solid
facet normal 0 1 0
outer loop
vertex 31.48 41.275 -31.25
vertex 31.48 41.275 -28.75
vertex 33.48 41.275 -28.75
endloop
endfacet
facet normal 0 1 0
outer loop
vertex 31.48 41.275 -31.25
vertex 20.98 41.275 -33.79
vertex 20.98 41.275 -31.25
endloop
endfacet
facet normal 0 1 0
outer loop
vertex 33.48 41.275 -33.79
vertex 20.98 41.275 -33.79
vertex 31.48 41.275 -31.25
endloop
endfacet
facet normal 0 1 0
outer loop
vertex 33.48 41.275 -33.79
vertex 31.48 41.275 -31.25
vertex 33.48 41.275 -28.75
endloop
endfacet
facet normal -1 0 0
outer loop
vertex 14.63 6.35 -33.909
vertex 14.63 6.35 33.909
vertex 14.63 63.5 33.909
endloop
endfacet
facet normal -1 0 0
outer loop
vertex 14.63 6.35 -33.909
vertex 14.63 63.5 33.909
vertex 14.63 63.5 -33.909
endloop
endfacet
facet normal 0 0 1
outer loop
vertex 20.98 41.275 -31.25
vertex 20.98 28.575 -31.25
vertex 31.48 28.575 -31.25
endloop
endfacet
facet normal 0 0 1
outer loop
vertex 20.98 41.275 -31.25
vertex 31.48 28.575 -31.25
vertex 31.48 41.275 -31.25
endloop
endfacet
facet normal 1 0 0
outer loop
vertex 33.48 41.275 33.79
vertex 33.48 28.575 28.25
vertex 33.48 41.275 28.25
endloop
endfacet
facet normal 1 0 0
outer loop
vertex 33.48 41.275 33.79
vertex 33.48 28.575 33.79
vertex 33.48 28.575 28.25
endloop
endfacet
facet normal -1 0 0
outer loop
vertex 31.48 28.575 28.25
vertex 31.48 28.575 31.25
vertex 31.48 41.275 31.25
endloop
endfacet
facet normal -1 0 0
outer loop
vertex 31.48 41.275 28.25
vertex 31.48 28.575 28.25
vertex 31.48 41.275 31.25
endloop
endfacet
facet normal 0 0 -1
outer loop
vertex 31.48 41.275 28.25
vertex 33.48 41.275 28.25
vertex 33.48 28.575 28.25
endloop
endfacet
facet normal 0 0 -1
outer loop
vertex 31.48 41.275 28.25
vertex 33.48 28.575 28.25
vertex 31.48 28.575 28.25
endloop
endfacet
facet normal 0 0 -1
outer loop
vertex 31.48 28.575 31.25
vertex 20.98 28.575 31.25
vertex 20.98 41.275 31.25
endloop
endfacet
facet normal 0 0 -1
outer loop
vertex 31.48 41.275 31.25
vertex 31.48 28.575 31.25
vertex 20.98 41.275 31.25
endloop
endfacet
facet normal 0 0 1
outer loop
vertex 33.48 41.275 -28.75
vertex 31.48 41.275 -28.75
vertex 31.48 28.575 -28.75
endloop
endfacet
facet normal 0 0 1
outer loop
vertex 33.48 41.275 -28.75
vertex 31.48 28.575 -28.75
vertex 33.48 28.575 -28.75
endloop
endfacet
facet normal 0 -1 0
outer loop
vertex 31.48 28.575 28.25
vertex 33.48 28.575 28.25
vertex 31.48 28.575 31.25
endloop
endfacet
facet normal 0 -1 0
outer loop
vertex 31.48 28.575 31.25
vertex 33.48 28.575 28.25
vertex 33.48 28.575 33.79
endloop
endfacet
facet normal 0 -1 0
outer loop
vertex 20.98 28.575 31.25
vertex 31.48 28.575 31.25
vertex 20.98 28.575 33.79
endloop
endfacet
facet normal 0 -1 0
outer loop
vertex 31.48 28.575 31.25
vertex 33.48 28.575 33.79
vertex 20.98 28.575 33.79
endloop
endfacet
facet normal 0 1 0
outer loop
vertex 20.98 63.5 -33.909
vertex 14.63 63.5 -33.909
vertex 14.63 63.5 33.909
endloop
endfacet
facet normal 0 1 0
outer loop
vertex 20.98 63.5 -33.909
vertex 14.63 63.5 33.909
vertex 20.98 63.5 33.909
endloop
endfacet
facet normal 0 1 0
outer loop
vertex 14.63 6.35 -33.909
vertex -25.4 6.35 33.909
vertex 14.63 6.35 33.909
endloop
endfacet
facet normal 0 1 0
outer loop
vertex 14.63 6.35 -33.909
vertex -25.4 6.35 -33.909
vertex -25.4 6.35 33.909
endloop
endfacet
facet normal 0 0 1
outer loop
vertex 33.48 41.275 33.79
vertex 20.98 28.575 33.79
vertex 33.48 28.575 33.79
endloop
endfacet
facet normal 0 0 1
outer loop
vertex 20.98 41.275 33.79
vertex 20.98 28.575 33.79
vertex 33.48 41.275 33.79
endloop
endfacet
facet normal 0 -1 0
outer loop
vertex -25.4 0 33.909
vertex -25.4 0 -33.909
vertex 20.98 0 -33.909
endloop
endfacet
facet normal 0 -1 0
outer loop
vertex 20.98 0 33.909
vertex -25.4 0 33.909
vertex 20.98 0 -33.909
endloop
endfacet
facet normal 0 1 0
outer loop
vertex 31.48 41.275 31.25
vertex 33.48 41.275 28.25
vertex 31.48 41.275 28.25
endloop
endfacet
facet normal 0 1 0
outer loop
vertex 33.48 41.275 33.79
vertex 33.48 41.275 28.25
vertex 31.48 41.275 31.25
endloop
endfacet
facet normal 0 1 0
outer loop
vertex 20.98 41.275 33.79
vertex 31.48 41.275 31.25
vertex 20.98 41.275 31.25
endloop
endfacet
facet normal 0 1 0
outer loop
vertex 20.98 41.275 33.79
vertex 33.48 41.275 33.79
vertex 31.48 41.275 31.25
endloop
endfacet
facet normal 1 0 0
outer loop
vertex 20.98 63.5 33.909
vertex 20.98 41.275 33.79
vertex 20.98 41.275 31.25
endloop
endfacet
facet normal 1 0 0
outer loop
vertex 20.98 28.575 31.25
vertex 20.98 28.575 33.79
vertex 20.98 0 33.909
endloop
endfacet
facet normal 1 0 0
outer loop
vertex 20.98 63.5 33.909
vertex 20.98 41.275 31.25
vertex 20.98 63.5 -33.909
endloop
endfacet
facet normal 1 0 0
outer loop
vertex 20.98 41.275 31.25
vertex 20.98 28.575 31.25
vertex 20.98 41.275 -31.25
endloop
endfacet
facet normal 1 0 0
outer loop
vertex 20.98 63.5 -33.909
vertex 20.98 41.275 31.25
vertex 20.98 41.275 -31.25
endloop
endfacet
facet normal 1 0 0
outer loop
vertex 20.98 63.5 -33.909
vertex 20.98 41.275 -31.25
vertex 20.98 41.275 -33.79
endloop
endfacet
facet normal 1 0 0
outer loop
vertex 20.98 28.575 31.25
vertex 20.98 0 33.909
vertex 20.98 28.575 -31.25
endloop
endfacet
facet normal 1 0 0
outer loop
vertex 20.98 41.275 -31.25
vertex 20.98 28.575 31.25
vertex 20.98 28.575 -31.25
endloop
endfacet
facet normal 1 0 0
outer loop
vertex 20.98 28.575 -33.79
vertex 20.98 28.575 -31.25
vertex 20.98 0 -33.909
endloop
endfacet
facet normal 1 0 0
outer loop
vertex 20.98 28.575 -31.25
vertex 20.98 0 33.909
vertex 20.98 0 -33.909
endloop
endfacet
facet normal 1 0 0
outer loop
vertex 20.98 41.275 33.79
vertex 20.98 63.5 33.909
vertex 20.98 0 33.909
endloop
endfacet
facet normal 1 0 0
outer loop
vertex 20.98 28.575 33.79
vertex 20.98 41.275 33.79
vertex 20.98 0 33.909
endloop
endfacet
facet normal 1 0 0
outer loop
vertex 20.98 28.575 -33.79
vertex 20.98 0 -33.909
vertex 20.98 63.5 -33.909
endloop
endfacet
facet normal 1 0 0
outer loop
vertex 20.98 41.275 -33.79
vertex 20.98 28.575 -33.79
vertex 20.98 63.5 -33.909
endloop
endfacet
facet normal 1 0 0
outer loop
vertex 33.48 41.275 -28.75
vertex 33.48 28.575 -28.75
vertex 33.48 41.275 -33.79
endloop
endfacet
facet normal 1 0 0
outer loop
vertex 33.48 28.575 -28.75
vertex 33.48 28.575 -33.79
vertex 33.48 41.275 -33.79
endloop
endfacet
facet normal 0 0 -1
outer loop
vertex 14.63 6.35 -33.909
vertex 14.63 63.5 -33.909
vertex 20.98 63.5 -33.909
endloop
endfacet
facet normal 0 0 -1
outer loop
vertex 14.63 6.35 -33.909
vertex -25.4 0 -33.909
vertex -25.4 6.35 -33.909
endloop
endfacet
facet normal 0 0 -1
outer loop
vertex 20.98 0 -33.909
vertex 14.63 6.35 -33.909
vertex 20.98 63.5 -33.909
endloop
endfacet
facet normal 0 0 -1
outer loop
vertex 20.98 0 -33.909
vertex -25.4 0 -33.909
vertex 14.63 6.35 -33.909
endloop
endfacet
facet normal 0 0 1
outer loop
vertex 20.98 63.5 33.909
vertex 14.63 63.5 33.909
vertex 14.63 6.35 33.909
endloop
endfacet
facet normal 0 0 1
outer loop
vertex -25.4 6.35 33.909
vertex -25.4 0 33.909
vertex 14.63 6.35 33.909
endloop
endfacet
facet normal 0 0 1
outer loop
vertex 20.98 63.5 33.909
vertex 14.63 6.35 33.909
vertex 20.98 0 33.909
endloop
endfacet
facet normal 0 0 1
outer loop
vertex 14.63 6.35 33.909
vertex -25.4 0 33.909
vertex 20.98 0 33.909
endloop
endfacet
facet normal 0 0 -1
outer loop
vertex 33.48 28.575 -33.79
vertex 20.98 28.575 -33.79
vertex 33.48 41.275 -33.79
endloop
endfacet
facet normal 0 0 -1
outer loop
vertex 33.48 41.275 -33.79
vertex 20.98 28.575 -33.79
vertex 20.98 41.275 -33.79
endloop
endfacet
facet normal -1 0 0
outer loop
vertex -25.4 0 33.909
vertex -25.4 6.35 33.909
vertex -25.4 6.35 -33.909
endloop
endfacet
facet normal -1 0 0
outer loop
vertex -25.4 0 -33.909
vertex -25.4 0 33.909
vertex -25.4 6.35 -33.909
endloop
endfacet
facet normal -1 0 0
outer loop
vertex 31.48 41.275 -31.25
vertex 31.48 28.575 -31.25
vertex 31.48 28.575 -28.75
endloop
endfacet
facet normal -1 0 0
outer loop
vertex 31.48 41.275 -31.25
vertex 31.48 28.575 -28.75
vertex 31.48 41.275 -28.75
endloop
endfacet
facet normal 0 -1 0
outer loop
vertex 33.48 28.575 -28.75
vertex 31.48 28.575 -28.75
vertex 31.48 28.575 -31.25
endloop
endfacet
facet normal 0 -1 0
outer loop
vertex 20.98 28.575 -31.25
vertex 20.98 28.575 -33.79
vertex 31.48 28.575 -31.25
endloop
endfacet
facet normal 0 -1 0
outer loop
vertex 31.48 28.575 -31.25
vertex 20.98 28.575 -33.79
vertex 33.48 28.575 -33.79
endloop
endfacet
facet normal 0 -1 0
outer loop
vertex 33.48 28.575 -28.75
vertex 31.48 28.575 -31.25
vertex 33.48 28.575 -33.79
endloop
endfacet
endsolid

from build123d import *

# Parameters (mm, degrees)
SKETCH1_R           = 50.8
BOSS_EXTRUDE1_DEPTH = 6.35
SKETCH2_W           = 6.35
SKETCH2_H           = 67.818
BOSS_EXTRUDE2_DEPTH = 57.15
SKETCH3_W           = 2.54
SKETCH3_H           = 12.7
BOSS_EXTRUDE3_DEPTH = 12.500000082
SKETCH4_W           = 2
SKETCH4_H           = 12.7
BOSS_EXTRUDE4_DEPTH = 3
SKETCH5_W           = 2
SKETCH5_H           = 12.7
BOSS_EXTRUDE5_DEPTH = 2.5
SKETCH6_OUTSIDE_W   = 135.018
SKETCH6_OUTSIDE_H   = 135.018
SKETCH6_OUTSIDE_W_2 = 46.379926406
SKETCH6_OUTSIDE_H_2 = 67.818
CUT_EXTRUDE1_DEPTH  = 7.35


with BuildPart() as part:
    # Sketch1 → Boss-Extrude1 (new body)
    with BuildSketch(Plane(origin=(0, 0, 0), x_dir=(1, 0, 0), z_dir=(0, 1, 0))):
        Circle(SKETCH1_R)
    extrude(amount=BOSS_EXTRUDE1_DEPTH)

    # Sketch2 → Boss-Extrude2 (add)
    with BuildSketch(Plane(origin=(0, 6.35, 0), x_dir=(1, 0, 0), z_dir=(0, 1, 0))):
        with Locations((17.804926406, 0)):
            Rectangle(SKETCH2_W, SKETCH2_H)
    extrude(amount=BOSS_EXTRUDE2_DEPTH)

    # Sketch3 → Boss-Extrude3 (add)
    with BuildSketch(Plane(origin=(20.979926406, 0, 0), x_dir=(0, 0, -1), z_dir=(1, 0, 0))):
        with Locations((-32.52, 34.925)):
            Rectangle(SKETCH3_W, SKETCH3_H)
        with Locations((32.52, 34.925)):
            Rectangle(SKETCH3_W, SKETCH3_H)
    extrude(amount=BOSS_EXTRUDE3_DEPTH)

    # Sketch4 → Boss-Extrude4 (add)
    with BuildSketch(Plane(origin=(0, 0, 31.25), x_dir=(-1, 0, 0), z_dir=(0, 0, -1))):
        with Locations((-32.479926488, 34.925)):
            Rectangle(SKETCH4_W, SKETCH4_H)
    extrude(amount=BOSS_EXTRUDE4_DEPTH)

    # Sketch5 → Boss-Extrude5 (add)
    with BuildSketch(Plane.XY.offset(-31.25)):
        with Locations((32.479926488, 34.925)):
            Rectangle(SKETCH5_W, SKETCH5_H)
    extrude(amount=BOSS_EXTRUDE5_DEPTH)

    # Sketch6 outside → Cut-Extrude1 (cut, through all)
    with BuildSketch(Plane(origin=(0, 6.35, 0), x_dir=(1, 0, 0), z_dir=(0, 1, 0))):
        Rectangle(SKETCH6_OUTSIDE_W, SKETCH6_OUTSIDE_H)
        with Locations((-2.210036797, 0)):
            Rectangle(SKETCH6_OUTSIDE_W_2, SKETCH6_OUTSIDE_H_2, mode=Mode.SUBTRACT)
    extrude(amount=-CUT_EXTRUDE1_DEPTH, mode=Mode.SUBTRACT)


solid = part.part
